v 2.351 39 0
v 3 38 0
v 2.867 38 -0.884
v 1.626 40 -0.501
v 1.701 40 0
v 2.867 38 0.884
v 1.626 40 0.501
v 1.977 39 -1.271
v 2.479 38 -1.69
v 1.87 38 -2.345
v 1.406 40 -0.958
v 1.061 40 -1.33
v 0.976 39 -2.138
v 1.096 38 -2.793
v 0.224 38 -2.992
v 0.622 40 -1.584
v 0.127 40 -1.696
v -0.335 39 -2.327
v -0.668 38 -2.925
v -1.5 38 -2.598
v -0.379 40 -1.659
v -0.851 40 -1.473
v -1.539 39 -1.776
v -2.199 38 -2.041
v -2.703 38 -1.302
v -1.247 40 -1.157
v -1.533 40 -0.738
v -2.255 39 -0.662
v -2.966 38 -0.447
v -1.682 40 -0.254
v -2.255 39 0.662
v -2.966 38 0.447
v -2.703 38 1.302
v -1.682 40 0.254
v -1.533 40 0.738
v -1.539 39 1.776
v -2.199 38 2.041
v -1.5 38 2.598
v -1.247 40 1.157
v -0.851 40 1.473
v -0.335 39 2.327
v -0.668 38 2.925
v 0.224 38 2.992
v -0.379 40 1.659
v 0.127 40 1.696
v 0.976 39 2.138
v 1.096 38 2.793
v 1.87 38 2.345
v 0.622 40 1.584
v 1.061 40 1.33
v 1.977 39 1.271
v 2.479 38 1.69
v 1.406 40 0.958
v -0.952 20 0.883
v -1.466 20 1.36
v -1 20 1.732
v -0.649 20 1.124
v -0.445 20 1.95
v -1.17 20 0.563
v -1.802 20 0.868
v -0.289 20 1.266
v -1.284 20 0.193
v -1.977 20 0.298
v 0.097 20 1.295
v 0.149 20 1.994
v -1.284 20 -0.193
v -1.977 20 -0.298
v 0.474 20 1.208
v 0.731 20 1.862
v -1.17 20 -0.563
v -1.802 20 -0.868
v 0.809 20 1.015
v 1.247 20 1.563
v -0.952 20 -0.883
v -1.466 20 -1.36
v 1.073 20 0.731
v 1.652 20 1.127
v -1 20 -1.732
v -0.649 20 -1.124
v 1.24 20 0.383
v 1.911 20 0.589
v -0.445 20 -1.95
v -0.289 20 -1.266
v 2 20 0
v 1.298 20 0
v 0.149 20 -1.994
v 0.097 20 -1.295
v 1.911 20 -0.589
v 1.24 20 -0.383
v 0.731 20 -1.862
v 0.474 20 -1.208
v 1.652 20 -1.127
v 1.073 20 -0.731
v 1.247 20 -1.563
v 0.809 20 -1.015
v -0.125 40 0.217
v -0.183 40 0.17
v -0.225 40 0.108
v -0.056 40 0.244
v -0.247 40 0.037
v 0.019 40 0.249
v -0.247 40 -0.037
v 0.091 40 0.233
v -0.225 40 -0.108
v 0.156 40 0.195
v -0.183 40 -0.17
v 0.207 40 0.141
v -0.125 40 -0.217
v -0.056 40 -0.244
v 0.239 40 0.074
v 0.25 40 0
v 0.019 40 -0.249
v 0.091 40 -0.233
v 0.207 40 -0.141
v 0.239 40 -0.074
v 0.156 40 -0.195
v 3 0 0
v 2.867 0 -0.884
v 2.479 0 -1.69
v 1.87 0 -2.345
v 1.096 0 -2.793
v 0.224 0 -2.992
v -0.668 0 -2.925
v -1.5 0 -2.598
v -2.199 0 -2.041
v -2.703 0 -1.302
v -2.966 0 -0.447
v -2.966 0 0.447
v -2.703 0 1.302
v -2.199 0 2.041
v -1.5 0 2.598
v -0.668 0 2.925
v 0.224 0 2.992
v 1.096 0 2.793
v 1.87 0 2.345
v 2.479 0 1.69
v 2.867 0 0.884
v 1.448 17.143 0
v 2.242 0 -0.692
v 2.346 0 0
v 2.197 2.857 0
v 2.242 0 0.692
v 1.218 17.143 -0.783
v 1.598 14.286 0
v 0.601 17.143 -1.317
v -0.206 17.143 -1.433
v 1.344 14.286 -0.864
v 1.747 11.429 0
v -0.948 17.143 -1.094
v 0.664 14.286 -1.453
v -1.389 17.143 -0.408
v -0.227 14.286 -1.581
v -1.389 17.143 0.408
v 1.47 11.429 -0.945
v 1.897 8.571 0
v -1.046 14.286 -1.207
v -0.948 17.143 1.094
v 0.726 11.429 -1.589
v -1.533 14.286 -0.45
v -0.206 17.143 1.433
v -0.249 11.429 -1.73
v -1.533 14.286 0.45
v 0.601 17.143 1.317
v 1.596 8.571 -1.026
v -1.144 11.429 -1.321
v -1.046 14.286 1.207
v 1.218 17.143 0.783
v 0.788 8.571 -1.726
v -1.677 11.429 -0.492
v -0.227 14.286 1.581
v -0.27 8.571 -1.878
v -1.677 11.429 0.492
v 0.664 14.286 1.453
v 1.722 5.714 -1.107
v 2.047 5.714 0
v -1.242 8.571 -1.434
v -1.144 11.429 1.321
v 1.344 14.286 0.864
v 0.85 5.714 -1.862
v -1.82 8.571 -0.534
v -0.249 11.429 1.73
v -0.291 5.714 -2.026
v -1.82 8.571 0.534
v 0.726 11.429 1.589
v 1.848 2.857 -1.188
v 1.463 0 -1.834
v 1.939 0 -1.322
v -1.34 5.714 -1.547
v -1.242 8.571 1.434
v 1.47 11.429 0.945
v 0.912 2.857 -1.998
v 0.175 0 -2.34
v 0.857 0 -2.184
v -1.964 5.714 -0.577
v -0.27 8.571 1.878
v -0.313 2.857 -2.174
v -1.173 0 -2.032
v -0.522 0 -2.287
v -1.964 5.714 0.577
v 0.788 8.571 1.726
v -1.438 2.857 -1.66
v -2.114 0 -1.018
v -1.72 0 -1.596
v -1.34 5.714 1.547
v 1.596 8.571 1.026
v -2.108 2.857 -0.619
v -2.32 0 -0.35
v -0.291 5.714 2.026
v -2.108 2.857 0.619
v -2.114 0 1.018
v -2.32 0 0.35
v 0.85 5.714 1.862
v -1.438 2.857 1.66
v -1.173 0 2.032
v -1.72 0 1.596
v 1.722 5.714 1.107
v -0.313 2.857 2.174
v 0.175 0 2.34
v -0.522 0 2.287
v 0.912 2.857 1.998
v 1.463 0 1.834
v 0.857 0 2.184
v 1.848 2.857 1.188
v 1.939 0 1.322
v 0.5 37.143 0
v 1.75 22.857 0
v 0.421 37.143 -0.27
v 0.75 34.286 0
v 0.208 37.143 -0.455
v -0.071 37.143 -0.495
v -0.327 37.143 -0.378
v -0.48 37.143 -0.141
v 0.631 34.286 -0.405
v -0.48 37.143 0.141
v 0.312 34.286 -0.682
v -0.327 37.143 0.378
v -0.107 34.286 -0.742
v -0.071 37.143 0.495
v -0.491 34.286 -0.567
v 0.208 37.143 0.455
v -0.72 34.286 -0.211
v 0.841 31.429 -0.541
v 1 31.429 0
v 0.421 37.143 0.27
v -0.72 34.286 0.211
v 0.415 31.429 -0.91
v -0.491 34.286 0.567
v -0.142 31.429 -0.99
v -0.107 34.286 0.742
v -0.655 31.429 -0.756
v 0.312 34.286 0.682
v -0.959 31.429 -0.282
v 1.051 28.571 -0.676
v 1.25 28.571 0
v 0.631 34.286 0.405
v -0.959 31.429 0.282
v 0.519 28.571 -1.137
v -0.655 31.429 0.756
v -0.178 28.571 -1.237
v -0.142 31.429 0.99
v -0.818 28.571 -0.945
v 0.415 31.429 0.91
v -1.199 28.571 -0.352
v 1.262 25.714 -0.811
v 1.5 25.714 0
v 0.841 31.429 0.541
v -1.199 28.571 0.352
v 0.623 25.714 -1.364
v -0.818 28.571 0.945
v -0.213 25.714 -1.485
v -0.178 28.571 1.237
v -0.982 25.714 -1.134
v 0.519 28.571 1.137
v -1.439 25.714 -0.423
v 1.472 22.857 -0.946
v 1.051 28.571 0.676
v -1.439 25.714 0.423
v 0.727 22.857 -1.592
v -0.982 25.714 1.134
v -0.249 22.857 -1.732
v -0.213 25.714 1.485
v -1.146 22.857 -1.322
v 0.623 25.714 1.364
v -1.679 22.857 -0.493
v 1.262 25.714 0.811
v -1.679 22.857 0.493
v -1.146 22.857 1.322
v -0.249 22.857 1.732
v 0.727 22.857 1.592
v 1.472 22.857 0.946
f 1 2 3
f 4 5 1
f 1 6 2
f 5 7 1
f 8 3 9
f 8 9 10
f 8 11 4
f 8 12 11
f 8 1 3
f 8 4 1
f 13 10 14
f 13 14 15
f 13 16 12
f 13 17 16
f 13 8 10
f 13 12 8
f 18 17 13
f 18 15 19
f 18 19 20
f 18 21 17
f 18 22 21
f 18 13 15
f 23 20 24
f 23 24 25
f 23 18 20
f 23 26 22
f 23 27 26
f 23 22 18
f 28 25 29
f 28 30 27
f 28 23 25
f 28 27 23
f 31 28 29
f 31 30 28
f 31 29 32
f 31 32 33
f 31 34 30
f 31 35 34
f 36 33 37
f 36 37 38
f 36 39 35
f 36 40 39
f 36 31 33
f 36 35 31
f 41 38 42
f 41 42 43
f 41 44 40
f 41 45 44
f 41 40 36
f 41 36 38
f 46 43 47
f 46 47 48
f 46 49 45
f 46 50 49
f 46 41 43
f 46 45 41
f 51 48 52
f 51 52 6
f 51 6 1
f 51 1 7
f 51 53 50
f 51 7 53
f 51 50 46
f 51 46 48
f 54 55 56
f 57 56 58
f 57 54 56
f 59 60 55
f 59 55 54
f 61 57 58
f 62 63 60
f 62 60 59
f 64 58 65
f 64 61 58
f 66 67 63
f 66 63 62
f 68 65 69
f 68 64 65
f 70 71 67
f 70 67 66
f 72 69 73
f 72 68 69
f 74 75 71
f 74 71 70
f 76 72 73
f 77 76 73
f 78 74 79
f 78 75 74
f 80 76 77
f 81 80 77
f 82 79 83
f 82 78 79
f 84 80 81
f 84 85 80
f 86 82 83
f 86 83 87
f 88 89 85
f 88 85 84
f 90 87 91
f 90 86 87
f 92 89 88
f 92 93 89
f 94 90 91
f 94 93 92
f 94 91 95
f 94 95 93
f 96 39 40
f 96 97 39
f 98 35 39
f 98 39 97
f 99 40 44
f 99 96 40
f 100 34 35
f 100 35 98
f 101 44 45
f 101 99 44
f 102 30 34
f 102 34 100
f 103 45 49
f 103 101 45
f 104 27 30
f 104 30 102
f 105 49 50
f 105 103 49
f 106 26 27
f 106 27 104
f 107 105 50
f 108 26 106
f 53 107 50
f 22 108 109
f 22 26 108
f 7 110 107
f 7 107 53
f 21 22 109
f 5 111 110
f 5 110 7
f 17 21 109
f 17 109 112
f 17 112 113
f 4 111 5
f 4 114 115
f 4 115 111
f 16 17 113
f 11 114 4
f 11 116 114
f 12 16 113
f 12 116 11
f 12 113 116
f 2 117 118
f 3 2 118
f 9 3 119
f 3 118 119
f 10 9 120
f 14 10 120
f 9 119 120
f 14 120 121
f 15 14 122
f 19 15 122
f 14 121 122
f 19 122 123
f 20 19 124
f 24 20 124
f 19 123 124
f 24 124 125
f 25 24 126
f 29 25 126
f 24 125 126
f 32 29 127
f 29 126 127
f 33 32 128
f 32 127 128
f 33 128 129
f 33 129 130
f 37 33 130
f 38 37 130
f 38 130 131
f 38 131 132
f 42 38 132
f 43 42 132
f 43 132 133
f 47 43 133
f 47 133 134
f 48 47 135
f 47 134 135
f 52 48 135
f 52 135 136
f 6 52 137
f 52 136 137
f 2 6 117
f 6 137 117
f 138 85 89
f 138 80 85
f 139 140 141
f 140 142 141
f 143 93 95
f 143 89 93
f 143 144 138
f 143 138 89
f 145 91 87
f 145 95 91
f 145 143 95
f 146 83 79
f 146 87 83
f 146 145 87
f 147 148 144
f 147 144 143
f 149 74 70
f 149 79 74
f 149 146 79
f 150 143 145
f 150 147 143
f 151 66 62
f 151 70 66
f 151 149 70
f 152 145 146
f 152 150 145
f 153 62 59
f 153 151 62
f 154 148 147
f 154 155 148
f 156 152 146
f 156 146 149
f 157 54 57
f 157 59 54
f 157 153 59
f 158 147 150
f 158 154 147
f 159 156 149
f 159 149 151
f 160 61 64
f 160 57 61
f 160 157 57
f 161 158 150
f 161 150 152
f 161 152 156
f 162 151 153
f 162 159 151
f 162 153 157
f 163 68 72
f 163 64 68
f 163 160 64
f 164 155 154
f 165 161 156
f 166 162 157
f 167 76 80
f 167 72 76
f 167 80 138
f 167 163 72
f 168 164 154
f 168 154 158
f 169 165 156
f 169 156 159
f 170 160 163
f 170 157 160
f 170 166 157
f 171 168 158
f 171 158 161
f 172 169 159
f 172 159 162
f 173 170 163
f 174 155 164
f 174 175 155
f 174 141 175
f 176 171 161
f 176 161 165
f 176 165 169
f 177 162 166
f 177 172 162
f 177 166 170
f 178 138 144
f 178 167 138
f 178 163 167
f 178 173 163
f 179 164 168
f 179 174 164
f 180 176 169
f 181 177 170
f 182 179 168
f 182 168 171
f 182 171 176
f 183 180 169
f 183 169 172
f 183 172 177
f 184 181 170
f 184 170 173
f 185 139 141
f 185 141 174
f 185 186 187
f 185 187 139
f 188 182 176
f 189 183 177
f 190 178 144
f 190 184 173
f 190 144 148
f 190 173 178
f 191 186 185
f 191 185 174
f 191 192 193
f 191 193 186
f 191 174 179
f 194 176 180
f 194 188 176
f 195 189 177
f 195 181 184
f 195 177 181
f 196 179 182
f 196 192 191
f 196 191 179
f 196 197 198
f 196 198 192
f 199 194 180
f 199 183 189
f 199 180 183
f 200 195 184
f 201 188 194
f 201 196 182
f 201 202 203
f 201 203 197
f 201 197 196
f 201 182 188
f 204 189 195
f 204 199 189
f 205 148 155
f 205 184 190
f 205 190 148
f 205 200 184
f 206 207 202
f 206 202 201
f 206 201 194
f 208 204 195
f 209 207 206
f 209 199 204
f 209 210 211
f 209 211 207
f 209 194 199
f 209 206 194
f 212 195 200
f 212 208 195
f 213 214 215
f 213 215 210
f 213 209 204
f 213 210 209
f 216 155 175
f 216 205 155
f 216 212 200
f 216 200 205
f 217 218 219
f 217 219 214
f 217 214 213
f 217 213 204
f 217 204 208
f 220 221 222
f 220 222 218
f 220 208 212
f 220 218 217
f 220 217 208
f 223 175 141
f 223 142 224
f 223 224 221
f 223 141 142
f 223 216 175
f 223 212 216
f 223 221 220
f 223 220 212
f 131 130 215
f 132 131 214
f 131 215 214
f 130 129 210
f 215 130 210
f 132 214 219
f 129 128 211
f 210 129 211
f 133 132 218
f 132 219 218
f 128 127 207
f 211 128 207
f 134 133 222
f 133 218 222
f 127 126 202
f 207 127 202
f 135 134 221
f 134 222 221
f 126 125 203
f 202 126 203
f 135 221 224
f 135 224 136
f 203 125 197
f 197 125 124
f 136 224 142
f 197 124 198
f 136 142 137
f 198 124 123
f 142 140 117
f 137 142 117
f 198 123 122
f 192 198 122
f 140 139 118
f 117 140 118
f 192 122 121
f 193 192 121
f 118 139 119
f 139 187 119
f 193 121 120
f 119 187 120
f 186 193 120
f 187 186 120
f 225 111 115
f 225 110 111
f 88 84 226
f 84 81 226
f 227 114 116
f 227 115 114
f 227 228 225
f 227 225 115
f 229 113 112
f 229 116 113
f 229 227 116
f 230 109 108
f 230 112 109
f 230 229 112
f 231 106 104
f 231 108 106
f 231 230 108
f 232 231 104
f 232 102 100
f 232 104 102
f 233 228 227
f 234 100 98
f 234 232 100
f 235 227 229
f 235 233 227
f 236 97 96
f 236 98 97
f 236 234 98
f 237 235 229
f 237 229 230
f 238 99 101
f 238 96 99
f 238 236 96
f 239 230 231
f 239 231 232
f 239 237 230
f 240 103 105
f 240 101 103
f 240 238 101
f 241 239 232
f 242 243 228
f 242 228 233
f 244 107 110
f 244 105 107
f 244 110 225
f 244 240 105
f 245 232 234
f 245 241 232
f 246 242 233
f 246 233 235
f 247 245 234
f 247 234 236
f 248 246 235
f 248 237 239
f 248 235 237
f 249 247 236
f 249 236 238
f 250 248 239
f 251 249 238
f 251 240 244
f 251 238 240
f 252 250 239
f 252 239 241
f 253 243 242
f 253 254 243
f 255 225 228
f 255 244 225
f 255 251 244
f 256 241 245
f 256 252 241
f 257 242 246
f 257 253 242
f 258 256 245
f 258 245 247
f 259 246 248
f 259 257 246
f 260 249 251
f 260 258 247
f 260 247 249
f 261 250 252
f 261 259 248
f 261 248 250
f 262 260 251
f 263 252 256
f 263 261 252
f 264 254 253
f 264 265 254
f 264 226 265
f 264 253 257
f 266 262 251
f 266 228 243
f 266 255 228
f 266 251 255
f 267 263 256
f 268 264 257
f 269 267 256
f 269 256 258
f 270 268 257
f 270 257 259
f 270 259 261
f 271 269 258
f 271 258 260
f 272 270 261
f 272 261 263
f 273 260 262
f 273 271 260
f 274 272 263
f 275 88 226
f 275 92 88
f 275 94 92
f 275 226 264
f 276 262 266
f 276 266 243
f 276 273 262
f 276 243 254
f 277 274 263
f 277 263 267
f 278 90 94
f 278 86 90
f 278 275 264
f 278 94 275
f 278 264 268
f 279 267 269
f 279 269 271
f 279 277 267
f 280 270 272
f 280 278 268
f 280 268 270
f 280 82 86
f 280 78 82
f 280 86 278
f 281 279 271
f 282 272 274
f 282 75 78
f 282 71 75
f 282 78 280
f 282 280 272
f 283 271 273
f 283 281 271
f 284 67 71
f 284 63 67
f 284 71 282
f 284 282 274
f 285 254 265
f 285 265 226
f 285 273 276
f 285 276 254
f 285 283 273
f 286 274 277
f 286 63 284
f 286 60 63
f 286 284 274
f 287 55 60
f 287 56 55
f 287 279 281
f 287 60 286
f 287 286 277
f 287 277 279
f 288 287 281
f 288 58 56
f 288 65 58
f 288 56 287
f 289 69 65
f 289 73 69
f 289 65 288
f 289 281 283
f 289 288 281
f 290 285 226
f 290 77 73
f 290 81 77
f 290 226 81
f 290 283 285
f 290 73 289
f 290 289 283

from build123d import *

# Parameters (mm, degrees)
SKETCH1_R           = 3
BOSS_EXTRUDE1_DEPTH = 40
SKETCH2_R           = 0.25
CUT_EXTRUDE1_DEPTH  = 41
CUT_EXTRUDE1_TAPER  = -3
SKETCH4_R           = 0.25
CUT_EXTRUDE3_DEPTH  = 20
CUT_EXTRUDE3_TAPER  = -5
CHAMFER2_SIZE       = 2
CHAMFER2_SIZE2      = 1.298815186


with BuildPart() as part:
    # Sketch1 → Boss-Extrude1 (new body)
    with BuildSketch(Plane(origin=(0, 0, 0), x_dir=(1, 0, 0), z_dir=(0, 1, 0))):
        Circle(SKETCH1_R)
    extrude(amount=BOSS_EXTRUDE1_DEPTH)

    # Sketch2 → Cut-Extrude1 (cut, through all)
    with BuildSketch(Plane(origin=(0, 40, 0), x_dir=(1, 0, 0), z_dir=(0, 1, 0))):
        Circle(SKETCH2_R)
    extrude(amount=-CUT_EXTRUDE1_DEPTH, taper=CUT_EXTRUDE1_TAPER, mode=Mode.SUBTRACT)

    # Sketch4 → Cut-Extrude3 (cut)
    with BuildSketch(Plane(origin=(0, 40, 0), x_dir=(1, 0, 0), z_dir=(0, 1, 0))):
        Circle(SKETCH4_R)
    extrude(amount=-CUT_EXTRUDE3_DEPTH, taper=CUT_EXTRUDE3_TAPER, mode=Mode.SUBTRACT)

    # Chamfer2
    chamfer2_edges = [part.edges().sort_by_distance(p)[0] for p in [
        (-3, 40, 0),
    ]]
    chamfer2_side = [part.faces().sort_by_distance(p)[0] for p in [
        (-3, 20, 0),
    ]]
    chamfer(chamfer2_edges, length=CHAMFER2_SIZE, length2=CHAMFER2_SIZE2, reference=chamfer2_side[0])


solid = part.part
